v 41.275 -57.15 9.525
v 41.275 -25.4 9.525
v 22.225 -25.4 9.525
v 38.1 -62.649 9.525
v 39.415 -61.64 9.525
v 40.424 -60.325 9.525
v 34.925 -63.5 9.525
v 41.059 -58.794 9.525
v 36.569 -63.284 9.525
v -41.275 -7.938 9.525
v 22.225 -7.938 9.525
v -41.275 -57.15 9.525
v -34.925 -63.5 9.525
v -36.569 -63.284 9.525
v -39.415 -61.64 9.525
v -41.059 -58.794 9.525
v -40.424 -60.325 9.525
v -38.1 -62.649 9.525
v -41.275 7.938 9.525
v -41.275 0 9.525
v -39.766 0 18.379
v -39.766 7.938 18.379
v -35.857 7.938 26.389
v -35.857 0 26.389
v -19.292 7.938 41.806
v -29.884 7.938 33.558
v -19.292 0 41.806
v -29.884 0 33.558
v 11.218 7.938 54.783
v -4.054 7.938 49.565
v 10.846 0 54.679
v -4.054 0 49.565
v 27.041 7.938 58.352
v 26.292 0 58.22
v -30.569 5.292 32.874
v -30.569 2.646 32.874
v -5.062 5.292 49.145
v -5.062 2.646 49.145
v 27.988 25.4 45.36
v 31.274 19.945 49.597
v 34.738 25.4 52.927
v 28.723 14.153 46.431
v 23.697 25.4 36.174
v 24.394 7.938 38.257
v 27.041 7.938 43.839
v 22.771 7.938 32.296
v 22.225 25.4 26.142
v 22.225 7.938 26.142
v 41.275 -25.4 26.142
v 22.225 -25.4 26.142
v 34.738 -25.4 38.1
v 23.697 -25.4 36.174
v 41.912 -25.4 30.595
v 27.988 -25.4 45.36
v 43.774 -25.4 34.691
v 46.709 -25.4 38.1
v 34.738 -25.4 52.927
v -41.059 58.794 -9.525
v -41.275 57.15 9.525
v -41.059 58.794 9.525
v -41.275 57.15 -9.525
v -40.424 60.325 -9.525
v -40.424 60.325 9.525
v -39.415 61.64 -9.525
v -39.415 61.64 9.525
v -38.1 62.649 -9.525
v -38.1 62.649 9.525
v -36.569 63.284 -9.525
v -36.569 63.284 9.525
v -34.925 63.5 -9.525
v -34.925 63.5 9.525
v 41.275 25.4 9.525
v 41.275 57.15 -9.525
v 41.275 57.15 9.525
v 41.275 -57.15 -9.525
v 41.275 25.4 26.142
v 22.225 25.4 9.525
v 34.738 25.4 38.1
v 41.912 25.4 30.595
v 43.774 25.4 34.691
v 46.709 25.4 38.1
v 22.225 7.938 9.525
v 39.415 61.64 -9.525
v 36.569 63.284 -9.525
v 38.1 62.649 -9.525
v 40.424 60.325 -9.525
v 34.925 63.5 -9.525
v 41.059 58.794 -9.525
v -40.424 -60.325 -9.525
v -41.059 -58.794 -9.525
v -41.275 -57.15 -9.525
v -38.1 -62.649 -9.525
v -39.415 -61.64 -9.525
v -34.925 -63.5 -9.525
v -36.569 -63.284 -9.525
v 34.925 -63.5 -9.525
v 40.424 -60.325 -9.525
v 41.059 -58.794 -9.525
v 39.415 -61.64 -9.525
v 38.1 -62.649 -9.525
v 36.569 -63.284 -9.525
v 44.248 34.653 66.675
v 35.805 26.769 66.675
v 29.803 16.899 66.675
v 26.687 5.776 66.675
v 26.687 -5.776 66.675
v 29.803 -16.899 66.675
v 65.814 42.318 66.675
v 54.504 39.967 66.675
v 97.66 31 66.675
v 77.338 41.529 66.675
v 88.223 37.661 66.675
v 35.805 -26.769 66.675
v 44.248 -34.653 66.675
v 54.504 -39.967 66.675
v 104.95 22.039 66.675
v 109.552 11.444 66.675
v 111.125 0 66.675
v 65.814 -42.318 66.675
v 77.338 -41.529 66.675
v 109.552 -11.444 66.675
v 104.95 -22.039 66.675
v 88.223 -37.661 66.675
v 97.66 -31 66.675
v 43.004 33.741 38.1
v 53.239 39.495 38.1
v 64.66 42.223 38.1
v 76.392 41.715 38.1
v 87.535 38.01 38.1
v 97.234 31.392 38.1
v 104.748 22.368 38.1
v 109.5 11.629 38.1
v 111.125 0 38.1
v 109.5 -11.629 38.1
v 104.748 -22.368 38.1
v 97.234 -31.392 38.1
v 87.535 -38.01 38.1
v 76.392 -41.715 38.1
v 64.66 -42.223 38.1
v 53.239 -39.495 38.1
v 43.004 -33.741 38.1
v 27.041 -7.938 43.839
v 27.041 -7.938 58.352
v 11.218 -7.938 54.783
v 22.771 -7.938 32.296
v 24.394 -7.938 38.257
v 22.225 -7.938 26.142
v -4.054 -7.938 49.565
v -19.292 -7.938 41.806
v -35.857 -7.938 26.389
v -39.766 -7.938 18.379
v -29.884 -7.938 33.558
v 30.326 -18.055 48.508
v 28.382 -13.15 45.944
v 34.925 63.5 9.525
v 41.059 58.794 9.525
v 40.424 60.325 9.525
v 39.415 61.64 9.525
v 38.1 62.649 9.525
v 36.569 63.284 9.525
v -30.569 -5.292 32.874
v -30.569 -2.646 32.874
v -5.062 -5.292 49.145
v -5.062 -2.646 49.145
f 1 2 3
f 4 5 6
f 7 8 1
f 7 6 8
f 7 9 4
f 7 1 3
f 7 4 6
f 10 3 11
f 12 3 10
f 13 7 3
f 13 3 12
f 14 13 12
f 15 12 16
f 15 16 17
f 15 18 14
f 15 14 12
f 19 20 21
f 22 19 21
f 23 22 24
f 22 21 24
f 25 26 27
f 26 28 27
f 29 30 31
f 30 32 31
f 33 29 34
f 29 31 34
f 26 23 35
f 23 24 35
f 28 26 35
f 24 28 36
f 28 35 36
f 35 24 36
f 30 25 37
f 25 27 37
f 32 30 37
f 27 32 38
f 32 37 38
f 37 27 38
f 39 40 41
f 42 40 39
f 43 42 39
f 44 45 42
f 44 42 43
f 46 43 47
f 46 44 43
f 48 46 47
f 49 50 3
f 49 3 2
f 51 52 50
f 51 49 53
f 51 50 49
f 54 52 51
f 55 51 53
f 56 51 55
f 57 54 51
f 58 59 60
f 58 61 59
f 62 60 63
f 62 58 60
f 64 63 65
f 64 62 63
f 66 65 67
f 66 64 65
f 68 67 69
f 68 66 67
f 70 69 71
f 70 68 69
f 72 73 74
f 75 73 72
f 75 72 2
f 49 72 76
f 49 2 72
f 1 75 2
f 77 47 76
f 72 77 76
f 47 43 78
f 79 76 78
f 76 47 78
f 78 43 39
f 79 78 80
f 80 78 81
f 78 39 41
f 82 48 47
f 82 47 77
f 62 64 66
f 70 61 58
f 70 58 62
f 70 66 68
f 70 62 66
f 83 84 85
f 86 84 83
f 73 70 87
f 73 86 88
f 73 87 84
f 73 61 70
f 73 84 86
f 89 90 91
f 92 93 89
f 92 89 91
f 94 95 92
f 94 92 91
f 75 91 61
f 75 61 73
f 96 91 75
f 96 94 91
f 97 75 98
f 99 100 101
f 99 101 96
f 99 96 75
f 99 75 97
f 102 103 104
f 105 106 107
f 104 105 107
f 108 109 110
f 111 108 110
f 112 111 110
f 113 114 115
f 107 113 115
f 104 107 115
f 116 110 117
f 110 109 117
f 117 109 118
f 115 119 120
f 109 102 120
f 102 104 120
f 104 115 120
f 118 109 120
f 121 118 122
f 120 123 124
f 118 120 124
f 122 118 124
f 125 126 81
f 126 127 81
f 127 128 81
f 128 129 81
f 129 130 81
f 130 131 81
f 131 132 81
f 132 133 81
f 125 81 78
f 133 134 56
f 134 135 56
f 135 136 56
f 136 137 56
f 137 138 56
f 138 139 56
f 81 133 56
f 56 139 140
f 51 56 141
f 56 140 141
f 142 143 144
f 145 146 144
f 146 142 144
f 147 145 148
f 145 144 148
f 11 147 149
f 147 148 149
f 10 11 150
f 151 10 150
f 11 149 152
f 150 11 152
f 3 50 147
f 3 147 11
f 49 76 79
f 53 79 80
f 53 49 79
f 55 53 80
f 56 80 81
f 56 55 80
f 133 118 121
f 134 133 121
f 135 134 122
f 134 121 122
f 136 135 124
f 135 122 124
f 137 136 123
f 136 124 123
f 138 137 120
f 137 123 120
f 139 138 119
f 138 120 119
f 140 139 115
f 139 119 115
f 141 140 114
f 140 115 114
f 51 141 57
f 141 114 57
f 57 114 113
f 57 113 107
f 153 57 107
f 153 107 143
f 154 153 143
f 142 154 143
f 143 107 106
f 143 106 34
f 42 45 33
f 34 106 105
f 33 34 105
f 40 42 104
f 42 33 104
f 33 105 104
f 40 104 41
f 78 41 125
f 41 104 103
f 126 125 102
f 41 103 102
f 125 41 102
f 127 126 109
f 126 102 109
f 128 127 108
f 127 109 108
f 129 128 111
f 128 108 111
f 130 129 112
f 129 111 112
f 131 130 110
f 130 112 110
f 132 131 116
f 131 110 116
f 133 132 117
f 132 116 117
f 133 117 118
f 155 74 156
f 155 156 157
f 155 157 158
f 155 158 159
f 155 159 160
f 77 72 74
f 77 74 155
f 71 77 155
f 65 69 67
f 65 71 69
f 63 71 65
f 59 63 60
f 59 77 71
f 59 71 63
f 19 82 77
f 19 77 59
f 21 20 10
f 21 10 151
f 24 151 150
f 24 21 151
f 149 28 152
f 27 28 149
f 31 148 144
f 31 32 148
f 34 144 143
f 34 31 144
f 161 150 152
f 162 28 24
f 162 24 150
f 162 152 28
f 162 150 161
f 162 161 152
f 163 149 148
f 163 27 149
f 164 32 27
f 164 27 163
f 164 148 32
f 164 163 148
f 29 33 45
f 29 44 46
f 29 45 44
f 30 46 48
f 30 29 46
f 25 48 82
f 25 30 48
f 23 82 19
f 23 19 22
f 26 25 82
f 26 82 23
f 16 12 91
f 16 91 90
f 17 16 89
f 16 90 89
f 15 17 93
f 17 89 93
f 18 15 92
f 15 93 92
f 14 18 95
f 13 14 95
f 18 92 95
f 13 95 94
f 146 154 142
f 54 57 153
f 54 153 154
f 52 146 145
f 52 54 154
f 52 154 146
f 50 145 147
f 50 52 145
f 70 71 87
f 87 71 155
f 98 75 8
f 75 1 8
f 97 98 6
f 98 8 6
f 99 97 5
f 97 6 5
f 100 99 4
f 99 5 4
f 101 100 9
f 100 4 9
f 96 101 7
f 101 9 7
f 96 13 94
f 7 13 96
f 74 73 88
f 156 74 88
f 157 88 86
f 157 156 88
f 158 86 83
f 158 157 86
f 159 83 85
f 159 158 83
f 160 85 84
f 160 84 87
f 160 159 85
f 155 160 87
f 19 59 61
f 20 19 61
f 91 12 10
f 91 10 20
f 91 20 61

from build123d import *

# Parameters (mm, degrees)
F1_DEPTH = 63.5
F0_W     = 8.383435
F0_H     = 19.05
F2_DEPTH = 25.4
F3_DEPTH = 7.9375
F5_R     = 6.35


with BuildPart() as f1:
    # F0 (on Front) → F1 (new body, symmetric)
    with BuildSketch(Plane.XZ):
        Polygon((-41.275, 9.525), (-41.275, -9.525), (41.275, -9.525), (41.275, 9.525), (22.225, 9.525), align=None)
    extrude(amount=F1_DEPTH, both=True)

    # F0 (on Front) → F2 (join, symmetric)
    with BuildSketch(Plane.XZ):
        with BuildLine():
            Line((22.225, 9.525), (41.275, 9.525))
            Line((41.275, 9.525), (41.275, 26.141635))
            ThreePointArc((41.275, 26.141635), (44.340935, 35.519453), (52.354492, 41.275))
            Line((52.354492, 41.275), (60.325, 41.275))
            Line((60.325, 41.275), (60.325, 60.325))
            Line((60.325, 60.325), (49.990866, 60.325))
            ThreePointArc((49.990866, 60.325), (30.041068, 48.161205), (22.225, 26.141635))
            Line((22.225, 26.141635), (22.225, 9.525))
        make_face()
        with Locations((64.516717, 50.8)):
            Rectangle(F0_W, F0_H)
    extrude(amount=F2_DEPTH, both=True)

    # F0 (on Front) → F3 (join, symmetric)
    with BuildSketch(Plane.XZ):
        with BuildLine():
            add(Edge.make_bspline(
                [(-41.275, 9.525), (-40.494805, 46.327003), (24.913717, 63.209177), (60.325, 60.325)],
                knots=[0, 0, 0, 0, 113.592253, 113.592253, 113.592253, 113.592253], degree=3))
            Line((-41.275, 9.525), (22.225, 9.525))
            Line((22.225, 9.525), (22.225, 26.141635))
            ThreePointArc((22.225, 26.141635), (30.041068, 48.161205), (49.990866, 60.325))
            Line((49.990866, 60.325), (60.325, 60.325))
        make_face()
    extrude(amount=F3_DEPTH, both=True)

    # F0 (on Front) → F4 (revolve)
    with BuildSketch(Plane.XZ):
        Polygon((68.708435, 66.675), (68.708435, 60.325), (68.708435, 41.275), (68.708435, 38.1), (111.125, 38.1), (111.125, 66.675), align=None)
    revolve(axis=Axis((68.708435, 0, 52.3875), (0, 0, -1)))

    # F5
    f5_edges = [f1.edges().sort_by_distance(p)[0] for p in [
        (-41.275, -63.5, 0),
        (41.275, -63.5, 0),
        (-41.275, 63.5, 0),
        (41.275, 63.5, 0),
    ]]
    fillet(f5_edges, radius=F5_R)


solid = f1.part
